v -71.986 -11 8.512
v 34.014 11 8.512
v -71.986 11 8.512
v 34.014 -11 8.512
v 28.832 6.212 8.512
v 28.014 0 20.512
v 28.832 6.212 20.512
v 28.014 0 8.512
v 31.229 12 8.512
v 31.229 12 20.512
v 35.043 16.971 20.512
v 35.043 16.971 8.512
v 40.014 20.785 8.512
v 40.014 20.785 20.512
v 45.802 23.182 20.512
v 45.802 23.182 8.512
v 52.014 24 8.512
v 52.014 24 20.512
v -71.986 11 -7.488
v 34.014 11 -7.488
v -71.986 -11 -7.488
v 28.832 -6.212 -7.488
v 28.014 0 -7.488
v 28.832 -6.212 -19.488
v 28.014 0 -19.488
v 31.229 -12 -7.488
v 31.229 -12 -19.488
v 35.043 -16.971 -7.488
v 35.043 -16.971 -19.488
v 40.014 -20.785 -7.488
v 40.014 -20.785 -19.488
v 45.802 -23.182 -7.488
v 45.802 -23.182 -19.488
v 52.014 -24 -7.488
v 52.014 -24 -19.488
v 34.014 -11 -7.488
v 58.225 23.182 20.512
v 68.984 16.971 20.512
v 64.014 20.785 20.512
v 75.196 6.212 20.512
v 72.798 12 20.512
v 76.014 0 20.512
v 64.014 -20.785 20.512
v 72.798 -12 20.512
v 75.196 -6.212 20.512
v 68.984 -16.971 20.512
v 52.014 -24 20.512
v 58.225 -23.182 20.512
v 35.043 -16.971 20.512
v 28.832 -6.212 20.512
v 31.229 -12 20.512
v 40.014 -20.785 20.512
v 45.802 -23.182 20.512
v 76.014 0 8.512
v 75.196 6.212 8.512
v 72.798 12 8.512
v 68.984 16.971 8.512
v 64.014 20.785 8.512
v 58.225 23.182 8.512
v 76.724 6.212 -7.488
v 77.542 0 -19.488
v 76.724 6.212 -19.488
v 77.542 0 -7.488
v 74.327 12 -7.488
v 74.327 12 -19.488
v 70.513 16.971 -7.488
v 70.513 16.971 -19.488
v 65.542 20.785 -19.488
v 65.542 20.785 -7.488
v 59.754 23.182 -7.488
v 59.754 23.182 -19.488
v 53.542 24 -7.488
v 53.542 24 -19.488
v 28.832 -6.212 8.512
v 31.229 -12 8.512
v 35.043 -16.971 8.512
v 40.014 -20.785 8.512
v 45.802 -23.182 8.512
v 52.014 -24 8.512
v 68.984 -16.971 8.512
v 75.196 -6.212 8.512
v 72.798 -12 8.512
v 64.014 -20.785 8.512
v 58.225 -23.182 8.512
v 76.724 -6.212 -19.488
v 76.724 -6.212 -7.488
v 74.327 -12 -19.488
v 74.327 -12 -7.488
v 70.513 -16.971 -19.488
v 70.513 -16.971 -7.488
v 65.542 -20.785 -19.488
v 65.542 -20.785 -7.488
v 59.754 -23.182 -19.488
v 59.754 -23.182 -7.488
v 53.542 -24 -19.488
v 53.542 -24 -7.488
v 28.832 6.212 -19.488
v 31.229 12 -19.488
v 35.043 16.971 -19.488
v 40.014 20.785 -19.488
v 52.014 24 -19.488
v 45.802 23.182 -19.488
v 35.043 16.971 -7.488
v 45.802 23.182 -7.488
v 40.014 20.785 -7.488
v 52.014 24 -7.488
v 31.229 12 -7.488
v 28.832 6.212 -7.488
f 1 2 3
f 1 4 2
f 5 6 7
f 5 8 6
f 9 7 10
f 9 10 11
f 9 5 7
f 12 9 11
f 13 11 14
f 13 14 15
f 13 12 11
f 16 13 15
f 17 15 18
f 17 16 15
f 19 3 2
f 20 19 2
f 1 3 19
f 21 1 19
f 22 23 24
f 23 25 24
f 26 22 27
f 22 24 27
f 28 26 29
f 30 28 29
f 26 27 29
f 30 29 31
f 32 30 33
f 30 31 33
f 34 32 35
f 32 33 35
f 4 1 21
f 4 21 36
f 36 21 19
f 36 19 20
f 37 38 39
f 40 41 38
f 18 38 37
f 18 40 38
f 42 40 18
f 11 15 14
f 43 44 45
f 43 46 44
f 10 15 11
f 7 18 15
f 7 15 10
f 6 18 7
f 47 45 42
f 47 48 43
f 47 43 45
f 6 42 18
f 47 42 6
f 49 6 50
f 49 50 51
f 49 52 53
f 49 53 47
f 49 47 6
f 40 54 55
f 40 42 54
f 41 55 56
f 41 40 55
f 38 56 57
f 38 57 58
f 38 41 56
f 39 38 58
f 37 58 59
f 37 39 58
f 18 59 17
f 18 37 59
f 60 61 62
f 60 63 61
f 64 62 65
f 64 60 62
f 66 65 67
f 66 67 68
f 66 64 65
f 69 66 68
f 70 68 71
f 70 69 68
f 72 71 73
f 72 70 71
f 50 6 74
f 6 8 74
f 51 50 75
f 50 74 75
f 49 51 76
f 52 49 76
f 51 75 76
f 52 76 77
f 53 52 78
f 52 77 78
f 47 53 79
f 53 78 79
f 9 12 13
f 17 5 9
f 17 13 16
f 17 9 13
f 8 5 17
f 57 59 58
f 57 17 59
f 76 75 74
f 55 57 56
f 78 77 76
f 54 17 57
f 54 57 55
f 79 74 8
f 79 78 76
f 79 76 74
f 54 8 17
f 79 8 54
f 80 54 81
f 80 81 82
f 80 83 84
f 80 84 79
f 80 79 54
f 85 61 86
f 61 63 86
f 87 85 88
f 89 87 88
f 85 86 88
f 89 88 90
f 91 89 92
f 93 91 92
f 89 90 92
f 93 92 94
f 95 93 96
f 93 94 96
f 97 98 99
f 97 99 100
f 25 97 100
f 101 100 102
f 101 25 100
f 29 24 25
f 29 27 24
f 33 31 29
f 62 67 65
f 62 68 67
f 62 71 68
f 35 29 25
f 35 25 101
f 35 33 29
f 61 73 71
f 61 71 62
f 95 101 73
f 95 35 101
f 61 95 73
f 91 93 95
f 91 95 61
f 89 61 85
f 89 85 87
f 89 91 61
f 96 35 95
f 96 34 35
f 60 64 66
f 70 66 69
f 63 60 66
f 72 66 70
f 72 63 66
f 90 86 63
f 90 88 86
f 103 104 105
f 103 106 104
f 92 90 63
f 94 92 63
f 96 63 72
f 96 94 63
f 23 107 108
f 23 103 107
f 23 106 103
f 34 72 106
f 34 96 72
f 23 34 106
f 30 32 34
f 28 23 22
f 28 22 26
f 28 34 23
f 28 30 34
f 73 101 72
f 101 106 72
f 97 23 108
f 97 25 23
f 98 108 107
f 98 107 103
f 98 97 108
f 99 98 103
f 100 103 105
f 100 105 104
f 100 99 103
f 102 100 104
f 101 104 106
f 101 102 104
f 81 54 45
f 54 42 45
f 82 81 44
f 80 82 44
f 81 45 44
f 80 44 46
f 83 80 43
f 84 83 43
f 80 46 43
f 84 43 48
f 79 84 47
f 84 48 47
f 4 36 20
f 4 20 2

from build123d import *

# Parameters (mm, degrees)
F1_DEPTH = 24
F2_DEPTH = 11
F3_R     = 23.99999
F3_2_R   = 23.99999


# Not quite as in the source:
# - a fillet or chamfer is up to 0.001 mm smaller than in the source, because OpenCascade refuses the exact size


with BuildPart() as f1:
    # F0 (on Front) → F1 (new body, symmetric)
    with BuildSketch(Plane.XZ):
        Polygon((28.0138015747, 20.5115029328), (28.0138015747, 8.5115029328), (34.0138015747, 8.5115029328), (76.0138015747, 8.5115029328), (76.0138015747, 20.5115029328), align=None)
    extrude(amount=F1_DEPTH, both=True)

    # F3 (radius 24 in the source; OpenCascade refuses exactly that, so slightly less here)
    f3_edges = [f1.edges().sort_by_distance(p)[0] for p in [
        (76.013802, -24, 14.511503),
        (76.013802, 24, 14.511503),
        (28.013802, -24, 14.511503),
        (28.013802, 24, 14.511503),
    ]]
    fillet(f3_edges, radius=F3_R)


with BuildPart() as f1b:
    # F0 (on Front) → F1, piece 2 (new body, symmetric)
    with BuildSketch(Plane.XZ):
        Polygon((34.0138015747, -7.4884970672), (28.0138015747, -7.4884970672), (28.0138015747, -19.4884970672), (77.5421783328, -19.4884970672), (77.5421783328, -7.4884970672), align=None)
    extrude(amount=F1_DEPTH, both=True)

    # F3#2 (radius 24 in the source; OpenCascade refuses exactly that, so slightly less here)
    f3_2_edges = [f1b.edges().sort_by_distance(p)[0] for p in [
        (77.542178, 24, -13.488497),
        (77.542178, -24, -13.488497),
        (28.013802, -24, -13.488497),
        (28.013802, 24, -13.488497),
    ]]
    fillet(f3_2_edges, radius=F3_2_R)


with BuildPart() as f2:
    # F0 (on Front) → F2 (new body, symmetric)
    with BuildSketch(Plane.XZ):
        Polygon((28.0138015747, 8.5115029328), (-71.9861984253, 8.5115029328), (-71.9861984253, -7.4884970672), (28.0138015747, -7.4884970672), (34.0138015747, -7.4884970672), (34.0138015747, 8.5115029328), align=None)
    extrude(amount=F2_DEPTH, both=True)


solid = Compound([f1.part, f1b.part, f2.part])
